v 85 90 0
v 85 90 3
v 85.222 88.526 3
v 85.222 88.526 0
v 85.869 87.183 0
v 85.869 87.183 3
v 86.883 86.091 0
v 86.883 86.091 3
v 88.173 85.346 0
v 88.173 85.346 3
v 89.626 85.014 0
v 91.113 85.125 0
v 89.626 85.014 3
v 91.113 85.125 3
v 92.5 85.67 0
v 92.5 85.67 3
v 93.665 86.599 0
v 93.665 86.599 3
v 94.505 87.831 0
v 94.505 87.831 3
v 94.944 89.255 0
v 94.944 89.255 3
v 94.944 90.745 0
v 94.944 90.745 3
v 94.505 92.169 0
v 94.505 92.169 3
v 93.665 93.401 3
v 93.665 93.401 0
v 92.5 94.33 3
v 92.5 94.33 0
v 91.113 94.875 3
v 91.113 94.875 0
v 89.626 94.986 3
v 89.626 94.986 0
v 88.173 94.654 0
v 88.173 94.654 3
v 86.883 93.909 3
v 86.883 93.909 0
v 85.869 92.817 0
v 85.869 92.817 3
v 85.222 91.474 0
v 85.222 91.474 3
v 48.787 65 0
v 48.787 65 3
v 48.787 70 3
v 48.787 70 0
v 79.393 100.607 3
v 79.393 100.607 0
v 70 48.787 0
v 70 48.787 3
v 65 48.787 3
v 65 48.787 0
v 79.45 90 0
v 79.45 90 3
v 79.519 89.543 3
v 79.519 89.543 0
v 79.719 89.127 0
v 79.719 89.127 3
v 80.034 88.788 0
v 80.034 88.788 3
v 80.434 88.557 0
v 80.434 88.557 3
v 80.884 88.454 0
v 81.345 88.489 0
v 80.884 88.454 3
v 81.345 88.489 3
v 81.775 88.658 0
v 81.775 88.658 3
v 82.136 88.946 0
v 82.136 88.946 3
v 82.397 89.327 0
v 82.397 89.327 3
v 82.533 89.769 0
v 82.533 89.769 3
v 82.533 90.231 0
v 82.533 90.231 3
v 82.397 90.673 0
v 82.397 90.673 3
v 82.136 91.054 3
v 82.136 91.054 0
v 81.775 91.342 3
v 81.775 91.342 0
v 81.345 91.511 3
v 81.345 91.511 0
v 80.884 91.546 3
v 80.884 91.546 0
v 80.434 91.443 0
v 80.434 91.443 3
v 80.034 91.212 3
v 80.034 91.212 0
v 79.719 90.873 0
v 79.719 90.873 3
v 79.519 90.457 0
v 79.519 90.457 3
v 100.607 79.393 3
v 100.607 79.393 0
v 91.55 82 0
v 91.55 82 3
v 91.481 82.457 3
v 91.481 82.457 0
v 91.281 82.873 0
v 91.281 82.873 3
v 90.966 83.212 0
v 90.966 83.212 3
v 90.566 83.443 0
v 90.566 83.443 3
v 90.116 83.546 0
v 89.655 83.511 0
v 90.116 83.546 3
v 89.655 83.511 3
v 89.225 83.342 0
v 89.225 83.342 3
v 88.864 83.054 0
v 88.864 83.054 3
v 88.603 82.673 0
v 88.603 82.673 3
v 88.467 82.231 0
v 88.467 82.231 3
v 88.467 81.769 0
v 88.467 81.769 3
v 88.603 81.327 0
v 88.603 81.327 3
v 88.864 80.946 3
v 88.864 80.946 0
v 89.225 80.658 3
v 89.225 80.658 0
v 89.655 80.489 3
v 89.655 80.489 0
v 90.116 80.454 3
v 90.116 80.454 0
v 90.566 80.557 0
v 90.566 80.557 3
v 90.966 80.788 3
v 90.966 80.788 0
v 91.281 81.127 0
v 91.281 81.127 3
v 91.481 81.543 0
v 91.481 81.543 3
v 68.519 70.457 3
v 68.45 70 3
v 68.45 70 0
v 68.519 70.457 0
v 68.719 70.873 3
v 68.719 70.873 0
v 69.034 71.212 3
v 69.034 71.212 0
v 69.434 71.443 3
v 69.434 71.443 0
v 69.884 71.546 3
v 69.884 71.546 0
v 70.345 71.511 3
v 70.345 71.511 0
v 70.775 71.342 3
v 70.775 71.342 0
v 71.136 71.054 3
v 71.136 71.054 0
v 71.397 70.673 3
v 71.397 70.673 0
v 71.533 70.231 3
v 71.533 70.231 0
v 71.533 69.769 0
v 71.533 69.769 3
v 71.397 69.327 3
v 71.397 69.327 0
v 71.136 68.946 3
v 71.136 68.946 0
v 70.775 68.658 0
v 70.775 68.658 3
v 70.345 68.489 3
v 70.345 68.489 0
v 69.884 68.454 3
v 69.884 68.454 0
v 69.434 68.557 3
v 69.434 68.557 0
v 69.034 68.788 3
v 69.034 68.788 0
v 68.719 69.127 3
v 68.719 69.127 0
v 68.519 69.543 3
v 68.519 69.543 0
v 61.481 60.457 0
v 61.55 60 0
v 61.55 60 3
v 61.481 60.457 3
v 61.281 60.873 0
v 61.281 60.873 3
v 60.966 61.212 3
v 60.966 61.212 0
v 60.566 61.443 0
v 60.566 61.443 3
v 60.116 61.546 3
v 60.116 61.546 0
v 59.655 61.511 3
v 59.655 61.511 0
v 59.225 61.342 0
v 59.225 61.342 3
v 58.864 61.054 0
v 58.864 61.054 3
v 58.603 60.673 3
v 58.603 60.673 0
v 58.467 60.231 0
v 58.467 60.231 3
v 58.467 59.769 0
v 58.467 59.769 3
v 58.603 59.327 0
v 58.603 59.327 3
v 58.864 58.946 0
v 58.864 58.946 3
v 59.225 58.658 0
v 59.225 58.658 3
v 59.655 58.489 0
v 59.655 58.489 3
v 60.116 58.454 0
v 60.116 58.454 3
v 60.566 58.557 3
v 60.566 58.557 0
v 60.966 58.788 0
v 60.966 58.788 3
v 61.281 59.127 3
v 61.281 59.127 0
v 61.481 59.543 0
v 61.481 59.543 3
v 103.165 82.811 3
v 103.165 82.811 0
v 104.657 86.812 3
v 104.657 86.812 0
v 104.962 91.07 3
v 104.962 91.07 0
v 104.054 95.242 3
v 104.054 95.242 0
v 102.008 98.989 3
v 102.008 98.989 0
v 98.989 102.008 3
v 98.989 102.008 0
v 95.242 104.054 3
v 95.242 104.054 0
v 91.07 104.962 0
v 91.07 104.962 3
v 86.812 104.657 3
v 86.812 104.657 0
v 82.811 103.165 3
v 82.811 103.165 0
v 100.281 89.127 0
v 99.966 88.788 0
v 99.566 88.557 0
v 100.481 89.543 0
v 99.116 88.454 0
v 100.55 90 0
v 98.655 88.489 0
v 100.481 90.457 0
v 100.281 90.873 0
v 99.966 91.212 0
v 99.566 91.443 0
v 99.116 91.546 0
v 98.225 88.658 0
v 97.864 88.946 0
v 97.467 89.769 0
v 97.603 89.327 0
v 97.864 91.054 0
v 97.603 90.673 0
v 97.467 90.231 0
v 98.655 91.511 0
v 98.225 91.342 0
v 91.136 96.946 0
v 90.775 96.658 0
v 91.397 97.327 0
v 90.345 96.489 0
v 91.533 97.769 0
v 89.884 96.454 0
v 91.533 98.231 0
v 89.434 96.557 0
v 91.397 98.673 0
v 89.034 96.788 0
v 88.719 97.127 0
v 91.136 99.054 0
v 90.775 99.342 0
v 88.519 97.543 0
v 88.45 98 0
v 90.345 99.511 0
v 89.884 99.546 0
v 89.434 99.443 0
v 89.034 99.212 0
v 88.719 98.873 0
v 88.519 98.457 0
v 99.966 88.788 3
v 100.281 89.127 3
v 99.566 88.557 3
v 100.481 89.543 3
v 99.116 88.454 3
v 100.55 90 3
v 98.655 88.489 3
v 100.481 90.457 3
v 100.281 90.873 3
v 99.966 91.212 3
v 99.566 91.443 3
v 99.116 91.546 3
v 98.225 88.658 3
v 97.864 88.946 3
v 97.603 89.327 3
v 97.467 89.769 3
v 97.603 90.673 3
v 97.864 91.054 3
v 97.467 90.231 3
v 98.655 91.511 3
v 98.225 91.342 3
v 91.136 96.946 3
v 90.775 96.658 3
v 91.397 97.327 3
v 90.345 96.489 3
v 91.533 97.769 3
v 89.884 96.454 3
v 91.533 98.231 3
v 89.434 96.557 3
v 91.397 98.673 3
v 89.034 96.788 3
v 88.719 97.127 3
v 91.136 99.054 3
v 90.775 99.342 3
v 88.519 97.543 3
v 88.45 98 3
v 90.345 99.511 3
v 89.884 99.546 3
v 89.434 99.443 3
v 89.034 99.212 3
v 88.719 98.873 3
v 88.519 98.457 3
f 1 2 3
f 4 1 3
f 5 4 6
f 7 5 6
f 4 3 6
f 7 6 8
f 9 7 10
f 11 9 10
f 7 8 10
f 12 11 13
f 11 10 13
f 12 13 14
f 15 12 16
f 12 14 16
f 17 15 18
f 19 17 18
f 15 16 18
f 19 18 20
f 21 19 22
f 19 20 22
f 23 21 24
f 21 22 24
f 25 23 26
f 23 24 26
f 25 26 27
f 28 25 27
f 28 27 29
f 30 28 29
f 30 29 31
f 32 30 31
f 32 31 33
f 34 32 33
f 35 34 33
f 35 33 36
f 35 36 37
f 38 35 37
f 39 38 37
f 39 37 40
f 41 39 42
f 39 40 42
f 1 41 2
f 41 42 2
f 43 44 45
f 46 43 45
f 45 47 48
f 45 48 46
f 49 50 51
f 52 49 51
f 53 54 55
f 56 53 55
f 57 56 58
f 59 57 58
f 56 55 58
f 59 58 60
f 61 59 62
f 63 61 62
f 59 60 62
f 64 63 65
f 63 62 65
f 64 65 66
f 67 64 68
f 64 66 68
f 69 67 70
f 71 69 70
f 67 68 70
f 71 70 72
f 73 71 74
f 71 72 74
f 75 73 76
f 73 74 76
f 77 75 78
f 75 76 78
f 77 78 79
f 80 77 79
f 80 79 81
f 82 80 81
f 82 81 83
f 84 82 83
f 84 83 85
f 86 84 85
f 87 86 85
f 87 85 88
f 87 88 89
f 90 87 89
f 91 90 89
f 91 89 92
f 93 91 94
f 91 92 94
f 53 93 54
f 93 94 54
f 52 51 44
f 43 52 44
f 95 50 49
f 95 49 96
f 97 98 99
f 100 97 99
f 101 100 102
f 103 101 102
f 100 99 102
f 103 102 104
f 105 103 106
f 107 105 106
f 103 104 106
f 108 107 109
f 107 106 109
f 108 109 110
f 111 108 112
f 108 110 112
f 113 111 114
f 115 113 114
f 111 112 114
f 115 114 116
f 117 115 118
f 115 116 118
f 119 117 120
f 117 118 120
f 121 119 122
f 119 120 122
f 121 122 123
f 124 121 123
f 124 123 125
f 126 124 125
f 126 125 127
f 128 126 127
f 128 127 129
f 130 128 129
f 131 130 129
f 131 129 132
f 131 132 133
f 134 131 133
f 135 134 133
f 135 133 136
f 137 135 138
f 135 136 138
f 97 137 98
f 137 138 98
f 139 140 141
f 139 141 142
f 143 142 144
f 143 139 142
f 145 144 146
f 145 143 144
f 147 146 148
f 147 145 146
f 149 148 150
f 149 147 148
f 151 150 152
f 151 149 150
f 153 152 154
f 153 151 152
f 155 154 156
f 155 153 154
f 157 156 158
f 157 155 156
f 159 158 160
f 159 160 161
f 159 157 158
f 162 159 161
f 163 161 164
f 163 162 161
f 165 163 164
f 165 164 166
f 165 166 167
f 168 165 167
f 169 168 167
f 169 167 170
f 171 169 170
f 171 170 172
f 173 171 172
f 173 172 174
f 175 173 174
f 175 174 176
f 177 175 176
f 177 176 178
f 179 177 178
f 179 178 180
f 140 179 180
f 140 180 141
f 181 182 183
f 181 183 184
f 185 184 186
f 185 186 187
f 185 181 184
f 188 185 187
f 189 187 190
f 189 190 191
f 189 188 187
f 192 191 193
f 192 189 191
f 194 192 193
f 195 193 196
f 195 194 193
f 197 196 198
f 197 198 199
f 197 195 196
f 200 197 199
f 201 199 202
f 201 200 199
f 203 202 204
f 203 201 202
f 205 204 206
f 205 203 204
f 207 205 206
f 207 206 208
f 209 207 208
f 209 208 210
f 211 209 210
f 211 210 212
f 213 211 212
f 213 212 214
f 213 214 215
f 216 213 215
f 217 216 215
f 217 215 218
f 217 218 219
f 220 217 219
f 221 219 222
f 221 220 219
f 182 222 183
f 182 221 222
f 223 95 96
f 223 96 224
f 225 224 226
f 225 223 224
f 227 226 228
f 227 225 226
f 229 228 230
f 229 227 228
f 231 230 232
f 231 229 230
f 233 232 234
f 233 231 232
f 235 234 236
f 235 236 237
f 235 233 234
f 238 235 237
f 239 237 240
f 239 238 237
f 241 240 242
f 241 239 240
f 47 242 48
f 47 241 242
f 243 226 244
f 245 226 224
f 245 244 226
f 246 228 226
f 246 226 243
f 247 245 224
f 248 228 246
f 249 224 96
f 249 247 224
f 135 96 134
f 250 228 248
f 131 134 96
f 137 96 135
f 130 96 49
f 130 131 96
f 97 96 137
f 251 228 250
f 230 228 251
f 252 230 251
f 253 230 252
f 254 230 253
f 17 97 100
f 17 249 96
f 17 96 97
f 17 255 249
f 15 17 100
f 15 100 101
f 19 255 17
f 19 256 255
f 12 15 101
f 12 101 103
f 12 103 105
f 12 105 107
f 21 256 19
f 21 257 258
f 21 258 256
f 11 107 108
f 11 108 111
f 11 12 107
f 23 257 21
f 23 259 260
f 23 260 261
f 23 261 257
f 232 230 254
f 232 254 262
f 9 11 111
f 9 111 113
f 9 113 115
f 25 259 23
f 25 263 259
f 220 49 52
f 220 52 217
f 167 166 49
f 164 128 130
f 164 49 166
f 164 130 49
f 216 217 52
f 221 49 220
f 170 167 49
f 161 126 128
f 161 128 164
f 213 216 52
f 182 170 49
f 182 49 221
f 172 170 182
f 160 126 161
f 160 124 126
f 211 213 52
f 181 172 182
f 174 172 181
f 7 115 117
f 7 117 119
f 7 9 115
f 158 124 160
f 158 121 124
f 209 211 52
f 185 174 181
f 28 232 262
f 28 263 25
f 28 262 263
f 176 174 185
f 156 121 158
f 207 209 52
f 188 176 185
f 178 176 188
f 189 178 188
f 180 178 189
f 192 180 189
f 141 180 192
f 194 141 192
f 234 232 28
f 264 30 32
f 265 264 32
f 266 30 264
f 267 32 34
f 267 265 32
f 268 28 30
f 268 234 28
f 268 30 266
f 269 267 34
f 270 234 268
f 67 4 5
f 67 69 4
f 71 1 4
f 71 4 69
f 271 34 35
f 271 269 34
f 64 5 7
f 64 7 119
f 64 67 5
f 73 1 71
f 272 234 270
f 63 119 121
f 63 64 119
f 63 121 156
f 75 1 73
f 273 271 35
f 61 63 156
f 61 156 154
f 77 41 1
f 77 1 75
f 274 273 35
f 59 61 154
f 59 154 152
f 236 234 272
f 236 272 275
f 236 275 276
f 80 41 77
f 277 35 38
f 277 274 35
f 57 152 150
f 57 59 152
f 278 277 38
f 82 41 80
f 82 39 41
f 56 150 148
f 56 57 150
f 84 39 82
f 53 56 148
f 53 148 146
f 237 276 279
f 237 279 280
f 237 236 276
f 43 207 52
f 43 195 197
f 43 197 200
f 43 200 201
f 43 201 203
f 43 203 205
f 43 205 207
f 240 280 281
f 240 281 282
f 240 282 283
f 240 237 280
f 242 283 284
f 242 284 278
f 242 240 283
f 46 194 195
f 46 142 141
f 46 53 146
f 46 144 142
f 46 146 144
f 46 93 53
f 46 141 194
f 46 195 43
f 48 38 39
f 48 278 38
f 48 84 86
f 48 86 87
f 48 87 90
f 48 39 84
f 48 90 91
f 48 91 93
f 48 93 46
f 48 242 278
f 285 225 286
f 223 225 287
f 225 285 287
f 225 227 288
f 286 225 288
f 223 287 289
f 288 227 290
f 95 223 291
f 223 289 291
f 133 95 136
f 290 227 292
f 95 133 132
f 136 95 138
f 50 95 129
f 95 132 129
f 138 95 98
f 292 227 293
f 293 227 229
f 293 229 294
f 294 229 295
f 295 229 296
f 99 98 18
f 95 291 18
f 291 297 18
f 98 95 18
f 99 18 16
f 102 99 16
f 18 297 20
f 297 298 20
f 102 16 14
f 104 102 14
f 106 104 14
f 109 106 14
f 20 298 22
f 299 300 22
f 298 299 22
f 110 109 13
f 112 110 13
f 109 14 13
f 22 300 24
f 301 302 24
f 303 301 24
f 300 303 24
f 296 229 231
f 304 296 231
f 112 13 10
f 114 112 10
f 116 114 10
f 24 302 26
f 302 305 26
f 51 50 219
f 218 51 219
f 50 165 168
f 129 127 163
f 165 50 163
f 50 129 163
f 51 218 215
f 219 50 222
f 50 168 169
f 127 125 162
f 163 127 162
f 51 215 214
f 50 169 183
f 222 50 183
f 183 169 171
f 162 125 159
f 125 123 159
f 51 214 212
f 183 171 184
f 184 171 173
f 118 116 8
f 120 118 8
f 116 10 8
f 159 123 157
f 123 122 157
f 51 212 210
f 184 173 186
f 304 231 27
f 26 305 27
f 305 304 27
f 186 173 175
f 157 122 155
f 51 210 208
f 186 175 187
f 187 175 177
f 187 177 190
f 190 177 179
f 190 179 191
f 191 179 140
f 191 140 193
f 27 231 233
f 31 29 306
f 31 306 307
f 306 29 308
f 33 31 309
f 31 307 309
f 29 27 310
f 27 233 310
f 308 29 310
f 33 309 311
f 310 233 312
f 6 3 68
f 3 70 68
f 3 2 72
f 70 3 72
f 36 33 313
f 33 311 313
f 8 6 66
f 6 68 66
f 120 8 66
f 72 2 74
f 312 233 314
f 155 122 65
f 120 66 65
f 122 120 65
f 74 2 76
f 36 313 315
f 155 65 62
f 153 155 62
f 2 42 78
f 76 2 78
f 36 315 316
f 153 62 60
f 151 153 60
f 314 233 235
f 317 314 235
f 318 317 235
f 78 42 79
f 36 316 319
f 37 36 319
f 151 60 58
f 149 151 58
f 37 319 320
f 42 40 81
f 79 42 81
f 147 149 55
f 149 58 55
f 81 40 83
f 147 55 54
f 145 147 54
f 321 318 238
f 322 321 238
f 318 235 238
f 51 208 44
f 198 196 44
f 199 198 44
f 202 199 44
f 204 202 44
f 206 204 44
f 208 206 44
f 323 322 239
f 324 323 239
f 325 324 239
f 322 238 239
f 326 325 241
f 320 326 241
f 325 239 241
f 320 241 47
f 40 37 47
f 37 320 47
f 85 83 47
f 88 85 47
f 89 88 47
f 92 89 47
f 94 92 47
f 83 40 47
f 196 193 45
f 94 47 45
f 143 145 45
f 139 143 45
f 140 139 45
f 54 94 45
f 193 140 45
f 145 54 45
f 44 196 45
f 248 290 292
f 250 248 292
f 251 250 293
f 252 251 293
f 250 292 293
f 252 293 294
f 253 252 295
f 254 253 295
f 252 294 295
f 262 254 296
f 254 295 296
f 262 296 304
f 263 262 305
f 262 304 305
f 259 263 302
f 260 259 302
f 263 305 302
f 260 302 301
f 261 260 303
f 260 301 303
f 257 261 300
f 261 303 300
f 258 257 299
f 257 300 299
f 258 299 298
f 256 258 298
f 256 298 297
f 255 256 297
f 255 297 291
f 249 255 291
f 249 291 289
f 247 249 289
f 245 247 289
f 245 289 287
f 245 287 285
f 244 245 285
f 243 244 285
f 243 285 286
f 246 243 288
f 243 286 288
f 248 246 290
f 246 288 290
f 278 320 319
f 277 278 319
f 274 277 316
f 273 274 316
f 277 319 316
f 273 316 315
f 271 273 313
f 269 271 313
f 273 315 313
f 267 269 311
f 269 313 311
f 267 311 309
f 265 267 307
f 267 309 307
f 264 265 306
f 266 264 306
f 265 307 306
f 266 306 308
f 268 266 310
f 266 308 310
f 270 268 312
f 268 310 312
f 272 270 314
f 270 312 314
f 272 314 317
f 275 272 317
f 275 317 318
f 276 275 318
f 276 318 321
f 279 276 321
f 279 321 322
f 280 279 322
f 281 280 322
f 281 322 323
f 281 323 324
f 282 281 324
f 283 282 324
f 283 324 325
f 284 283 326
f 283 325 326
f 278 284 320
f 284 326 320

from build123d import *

# Parameters (mm, degrees)
SKETCH_1_W          = 140
SKETCH_1_H          = 140
SKETCH_1_R          = 1.55
EXTRUDE_1_DEPTH     = 3
SKETCH_2_R          = 1.55
SKETCH_2_W          = 3
SKETCH_2_H          = 25
CUT_EXTRUDE_1_DEPTH = 100.040395799
SKETCH_3_R          = 5
SKETCH_3_R_2        = 1.55
EXTRUDE_2_DEPTH     = 3
CUT_EXTRUDE_START   = -10
SKETCH_4_R          = 1.55
CUT_EXTRUDE_2_DEPTH = 10


with BuildPart() as part:
    # 草圖1 → 填料-伸長1 (new body)
    with BuildSketch(Plane.XY):
        Rectangle(SKETCH_1_W, SKETCH_1_H)
        with Locations((-60, 60)):
            Circle(SKETCH_1_R, mode=Mode.SUBTRACT)
        with Locations((60, 60)):
            Circle(SKETCH_1_R, mode=Mode.SUBTRACT)
        with Locations((60, -60)):
            Circle(SKETCH_1_R, mode=Mode.SUBTRACT)
        with Locations((-60, -60)):
            Circle(SKETCH_1_R, mode=Mode.SUBTRACT)
    extrude(amount=EXTRUDE_1_DEPTH)

    # 草圖2 → 除料-伸長1 (cut, through all)
    with BuildSketch(Plane.XY.offset(3)):
        with Locations((-12.25, 62.5)):
            Circle(SKETCH_2_R)
        with Locations((12.25, 62.5)):
            Circle(SKETCH_2_R)
        with Locations((-12.25, 7.5)):
            Circle(SKETCH_2_R)
        with Locations((12.25, 7.5)):
            Circle(SKETCH_2_R)
        with Locations((-60, -30)):
            Rectangle(SKETCH_2_W, SKETCH_2_H)
        with Locations((-60, 30)):
            Rectangle(SKETCH_2_W, SKETCH_2_H)
        with Locations((-20, -30)):
            Rectangle(SKETCH_2_W, SKETCH_2_H)
        with Locations((-20, 30)):
            Rectangle(SKETCH_2_W, SKETCH_2_H)
        with Locations((20, 30)):
            Rectangle(SKETCH_2_W, SKETCH_2_H)
        with Locations((20, -30)):
            Rectangle(SKETCH_2_W, SKETCH_2_H)
        with Locations((60, -30)):
            Rectangle(SKETCH_2_W, SKETCH_2_H)
        with Locations((60, 30)):
            Rectangle(SKETCH_2_W, SKETCH_2_H)
    extrude(amount=-CUT_EXTRUDE_1_DEPTH, mode=Mode.SUBTRACT)

    # 草圖3 → 填料-伸長2 (add)
    # profile 1 of 4: a face of its own
    with BuildSketch(Plane.XY.offset(3)):
        with BuildLine():
            Line((-79.393398282, 100.606601718), (-48.786796564, 70))
            Line((-48.786796564, 70), (-70, 70))
            Line((-70, 70), (-70, 48.786796564))
            Line((-70, 48.786796564), (-100.606601718, 79.393398282))
            ThreePointArc((-100.606601718, 79.393398282), (-100.606601718, 100.606601718), (-79.393398282, 100.606601718))
        make_face()
        with Locations((-90, 90)):
            Circle(SKETCH_3_R, mode=Mode.SUBTRACT)
        with Locations((-81, 90)):
            Circle(SKETCH_3_R_2, mode=Mode.SUBTRACT)
        with Locations((-90, 98)):
            Circle(SKETCH_3_R_2, mode=Mode.SUBTRACT)
        with Locations(Location((-99, 90, 0), (0, 0, 180))):
            Circle(SKETCH_3_R_2, mode=Mode.SUBTRACT)
        with Locations(Location((-90, 82, 0), (0, 0, 180))):
            Circle(SKETCH_3_R_2, mode=Mode.SUBTRACT)
    # profile 2 of 4: a face of its own
    with BuildSketch(Plane.XY.offset(3)):
        with BuildLine():
            Line((48.786796564, 70), (70, 70))
            Line((70, 70), (70, 48.786796564))
            Line((70, 48.786796564), (100.606601718, 79.393398282))
            ThreePointArc((100.606601718, 79.393398282), (100.606601718, 100.606601718), (79.393398282, 100.606601718))
            Line((79.393398282, 100.606601718), (48.786796564, 70))
        make_face()
        with Locations(Location((81, 90, 0), (0, 0, 180))):
            Circle(SKETCH_3_R_2, mode=Mode.SUBTRACT)
        with Locations(Location((90, 90, 0), (0, 0, 180))):
            Circle(SKETCH_3_R, mode=Mode.SUBTRACT)
        with Locations((90, 82)):
            Circle(SKETCH_3_R_2, mode=Mode.SUBTRACT)
        with Locations(Location((90, 98, 0), (0, 0, 180))):
            Circle(SKETCH_3_R_2, mode=Mode.SUBTRACT)
        with Locations((99, 90)):
            Circle(SKETCH_3_R_2, mode=Mode.SUBTRACT)
    # profile 3 of 4: a face of its own
    with BuildSketch(Plane.XY.offset(3)):
        with BuildLine():
            Line((-48.786796564, -70), (-70, -70))
            Line((-70, -70), (-70, -48.786796564))
            Line((-70, -48.786796564), (-100.606601718, -79.393398282))
            ThreePointArc((-100.606601718, -79.393398282), (-100.606601718, -100.606601718), (-79.393398282, -100.606601718))
            Line((-79.393398282, -100.606601718), (-48.786796564, -70))
        make_face()
        with Locations((-90, -82)):
            Circle(SKETCH_3_R_2, mode=Mode.SUBTRACT)
        with Locations(Location((-90, -90, 0), (0, 0, 180))):
            Circle(SKETCH_3_R, mode=Mode.SUBTRACT)
        with Locations(Location((-81, -90, 0), (0, 0, 180))):
            Circle(SKETCH_3_R_2, mode=Mode.SUBTRACT)
        with Locations(Location((-90, -98, 0), (0, 0, 180))):
            Circle(SKETCH_3_R_2, mode=Mode.SUBTRACT)
        with Locations((-99, -90)):
            Circle(SKETCH_3_R_2, mode=Mode.SUBTRACT)
    # profile 4 of 4: a face of its own
    with BuildSketch(Plane.XY.offset(3)):
        with BuildLine():
            Line((79.393398282, -100.606601718), (48.786796564, -70))
            Line((48.786796564, -70), (70, -70))
            Line((70, -70), (70, -48.786796564))
            Line((70, -48.786796564), (100.606601718, -79.393398282))
            ThreePointArc((100.606601718, -79.393398282), (100.606601718, -100.606601718), (79.393398282, -100.606601718))
        make_face()
        with Locations(Location((90, -82, 0), (0, 0, 180))):
            Circle(SKETCH_3_R_2, mode=Mode.SUBTRACT)
        with Locations((90, -90)):
            Circle(SKETCH_3_R, mode=Mode.SUBTRACT)
        with Locations((81, -90)):
            Circle(SKETCH_3_R_2, mode=Mode.SUBTRACT)
        with Locations((90, -98)):
            Circle(SKETCH_3_R_2, mode=Mode.SUBTRACT)
        with Locations(Location((99, -90, 0), (0, 0, 180))):
            Circle(SKETCH_3_R_2, mode=Mode.SUBTRACT)
    extrude(amount=-EXTRUDE_2_DEPTH)

    # 草圖4 → 除料-伸長2 (cut)
    with BuildSketch(Plane(origin=(0, 0, 0), x_dir=(-1, 0, 0), z_dir=(0, 0, -1)).offset(CUT_EXTRUDE_START)):
        with Locations((-70, 70)):
            Circle(SKETCH_4_R)
        with BuildLine():
            Line((-70, 48.786796564), (-65, 48.786796564))
            Line((-65, 48.786796564), (-48.786796564, 65))
            Line((-48.786796564, 65), (-48.786796564, 70))
            Line((-48.786796564, 70), (48.786796564, 70))
            Line((48.786796564, 70), (79.393398282, 100.606601718))
            ThreePointArc((79.393398282, 100.606601718), (100.606601718, 100.606601718), (100.606601718, 79.393398282))
            Line((100.606601718, 79.393398282), (70, 48.786796564))
            Line((70, 48.786796564), (70, -48.786796564))
            Line((70, -48.786796564), (100.606601718, -79.393398282))
            ThreePointArc((100.606601718, -79.393398282), (100.606601718, -100.606601718), (79.393398282, -100.606601718))
            Line((79.393398282, -100.606601718), (48.786796564, -70))
            Line((48.786796564, -70), (-48.786796564, -70))
            Line((-48.786796564, -70), (-79.393398282, -100.606601718))
            ThreePointArc((-79.393398282, -100.606601718), (-100.606601718, -100.606601718), (-100.606601718, -79.393398282))
            Line((-100.606601718, -79.393398282), (-70, -48.786796564))
            Line((-70, -48.786796564), (-70, 48.786796564))
        make_face()
    extrude(amount=CUT_EXTRUDE_2_DEPTH, mode=Mode.SUBTRACT)


solid = part.part
